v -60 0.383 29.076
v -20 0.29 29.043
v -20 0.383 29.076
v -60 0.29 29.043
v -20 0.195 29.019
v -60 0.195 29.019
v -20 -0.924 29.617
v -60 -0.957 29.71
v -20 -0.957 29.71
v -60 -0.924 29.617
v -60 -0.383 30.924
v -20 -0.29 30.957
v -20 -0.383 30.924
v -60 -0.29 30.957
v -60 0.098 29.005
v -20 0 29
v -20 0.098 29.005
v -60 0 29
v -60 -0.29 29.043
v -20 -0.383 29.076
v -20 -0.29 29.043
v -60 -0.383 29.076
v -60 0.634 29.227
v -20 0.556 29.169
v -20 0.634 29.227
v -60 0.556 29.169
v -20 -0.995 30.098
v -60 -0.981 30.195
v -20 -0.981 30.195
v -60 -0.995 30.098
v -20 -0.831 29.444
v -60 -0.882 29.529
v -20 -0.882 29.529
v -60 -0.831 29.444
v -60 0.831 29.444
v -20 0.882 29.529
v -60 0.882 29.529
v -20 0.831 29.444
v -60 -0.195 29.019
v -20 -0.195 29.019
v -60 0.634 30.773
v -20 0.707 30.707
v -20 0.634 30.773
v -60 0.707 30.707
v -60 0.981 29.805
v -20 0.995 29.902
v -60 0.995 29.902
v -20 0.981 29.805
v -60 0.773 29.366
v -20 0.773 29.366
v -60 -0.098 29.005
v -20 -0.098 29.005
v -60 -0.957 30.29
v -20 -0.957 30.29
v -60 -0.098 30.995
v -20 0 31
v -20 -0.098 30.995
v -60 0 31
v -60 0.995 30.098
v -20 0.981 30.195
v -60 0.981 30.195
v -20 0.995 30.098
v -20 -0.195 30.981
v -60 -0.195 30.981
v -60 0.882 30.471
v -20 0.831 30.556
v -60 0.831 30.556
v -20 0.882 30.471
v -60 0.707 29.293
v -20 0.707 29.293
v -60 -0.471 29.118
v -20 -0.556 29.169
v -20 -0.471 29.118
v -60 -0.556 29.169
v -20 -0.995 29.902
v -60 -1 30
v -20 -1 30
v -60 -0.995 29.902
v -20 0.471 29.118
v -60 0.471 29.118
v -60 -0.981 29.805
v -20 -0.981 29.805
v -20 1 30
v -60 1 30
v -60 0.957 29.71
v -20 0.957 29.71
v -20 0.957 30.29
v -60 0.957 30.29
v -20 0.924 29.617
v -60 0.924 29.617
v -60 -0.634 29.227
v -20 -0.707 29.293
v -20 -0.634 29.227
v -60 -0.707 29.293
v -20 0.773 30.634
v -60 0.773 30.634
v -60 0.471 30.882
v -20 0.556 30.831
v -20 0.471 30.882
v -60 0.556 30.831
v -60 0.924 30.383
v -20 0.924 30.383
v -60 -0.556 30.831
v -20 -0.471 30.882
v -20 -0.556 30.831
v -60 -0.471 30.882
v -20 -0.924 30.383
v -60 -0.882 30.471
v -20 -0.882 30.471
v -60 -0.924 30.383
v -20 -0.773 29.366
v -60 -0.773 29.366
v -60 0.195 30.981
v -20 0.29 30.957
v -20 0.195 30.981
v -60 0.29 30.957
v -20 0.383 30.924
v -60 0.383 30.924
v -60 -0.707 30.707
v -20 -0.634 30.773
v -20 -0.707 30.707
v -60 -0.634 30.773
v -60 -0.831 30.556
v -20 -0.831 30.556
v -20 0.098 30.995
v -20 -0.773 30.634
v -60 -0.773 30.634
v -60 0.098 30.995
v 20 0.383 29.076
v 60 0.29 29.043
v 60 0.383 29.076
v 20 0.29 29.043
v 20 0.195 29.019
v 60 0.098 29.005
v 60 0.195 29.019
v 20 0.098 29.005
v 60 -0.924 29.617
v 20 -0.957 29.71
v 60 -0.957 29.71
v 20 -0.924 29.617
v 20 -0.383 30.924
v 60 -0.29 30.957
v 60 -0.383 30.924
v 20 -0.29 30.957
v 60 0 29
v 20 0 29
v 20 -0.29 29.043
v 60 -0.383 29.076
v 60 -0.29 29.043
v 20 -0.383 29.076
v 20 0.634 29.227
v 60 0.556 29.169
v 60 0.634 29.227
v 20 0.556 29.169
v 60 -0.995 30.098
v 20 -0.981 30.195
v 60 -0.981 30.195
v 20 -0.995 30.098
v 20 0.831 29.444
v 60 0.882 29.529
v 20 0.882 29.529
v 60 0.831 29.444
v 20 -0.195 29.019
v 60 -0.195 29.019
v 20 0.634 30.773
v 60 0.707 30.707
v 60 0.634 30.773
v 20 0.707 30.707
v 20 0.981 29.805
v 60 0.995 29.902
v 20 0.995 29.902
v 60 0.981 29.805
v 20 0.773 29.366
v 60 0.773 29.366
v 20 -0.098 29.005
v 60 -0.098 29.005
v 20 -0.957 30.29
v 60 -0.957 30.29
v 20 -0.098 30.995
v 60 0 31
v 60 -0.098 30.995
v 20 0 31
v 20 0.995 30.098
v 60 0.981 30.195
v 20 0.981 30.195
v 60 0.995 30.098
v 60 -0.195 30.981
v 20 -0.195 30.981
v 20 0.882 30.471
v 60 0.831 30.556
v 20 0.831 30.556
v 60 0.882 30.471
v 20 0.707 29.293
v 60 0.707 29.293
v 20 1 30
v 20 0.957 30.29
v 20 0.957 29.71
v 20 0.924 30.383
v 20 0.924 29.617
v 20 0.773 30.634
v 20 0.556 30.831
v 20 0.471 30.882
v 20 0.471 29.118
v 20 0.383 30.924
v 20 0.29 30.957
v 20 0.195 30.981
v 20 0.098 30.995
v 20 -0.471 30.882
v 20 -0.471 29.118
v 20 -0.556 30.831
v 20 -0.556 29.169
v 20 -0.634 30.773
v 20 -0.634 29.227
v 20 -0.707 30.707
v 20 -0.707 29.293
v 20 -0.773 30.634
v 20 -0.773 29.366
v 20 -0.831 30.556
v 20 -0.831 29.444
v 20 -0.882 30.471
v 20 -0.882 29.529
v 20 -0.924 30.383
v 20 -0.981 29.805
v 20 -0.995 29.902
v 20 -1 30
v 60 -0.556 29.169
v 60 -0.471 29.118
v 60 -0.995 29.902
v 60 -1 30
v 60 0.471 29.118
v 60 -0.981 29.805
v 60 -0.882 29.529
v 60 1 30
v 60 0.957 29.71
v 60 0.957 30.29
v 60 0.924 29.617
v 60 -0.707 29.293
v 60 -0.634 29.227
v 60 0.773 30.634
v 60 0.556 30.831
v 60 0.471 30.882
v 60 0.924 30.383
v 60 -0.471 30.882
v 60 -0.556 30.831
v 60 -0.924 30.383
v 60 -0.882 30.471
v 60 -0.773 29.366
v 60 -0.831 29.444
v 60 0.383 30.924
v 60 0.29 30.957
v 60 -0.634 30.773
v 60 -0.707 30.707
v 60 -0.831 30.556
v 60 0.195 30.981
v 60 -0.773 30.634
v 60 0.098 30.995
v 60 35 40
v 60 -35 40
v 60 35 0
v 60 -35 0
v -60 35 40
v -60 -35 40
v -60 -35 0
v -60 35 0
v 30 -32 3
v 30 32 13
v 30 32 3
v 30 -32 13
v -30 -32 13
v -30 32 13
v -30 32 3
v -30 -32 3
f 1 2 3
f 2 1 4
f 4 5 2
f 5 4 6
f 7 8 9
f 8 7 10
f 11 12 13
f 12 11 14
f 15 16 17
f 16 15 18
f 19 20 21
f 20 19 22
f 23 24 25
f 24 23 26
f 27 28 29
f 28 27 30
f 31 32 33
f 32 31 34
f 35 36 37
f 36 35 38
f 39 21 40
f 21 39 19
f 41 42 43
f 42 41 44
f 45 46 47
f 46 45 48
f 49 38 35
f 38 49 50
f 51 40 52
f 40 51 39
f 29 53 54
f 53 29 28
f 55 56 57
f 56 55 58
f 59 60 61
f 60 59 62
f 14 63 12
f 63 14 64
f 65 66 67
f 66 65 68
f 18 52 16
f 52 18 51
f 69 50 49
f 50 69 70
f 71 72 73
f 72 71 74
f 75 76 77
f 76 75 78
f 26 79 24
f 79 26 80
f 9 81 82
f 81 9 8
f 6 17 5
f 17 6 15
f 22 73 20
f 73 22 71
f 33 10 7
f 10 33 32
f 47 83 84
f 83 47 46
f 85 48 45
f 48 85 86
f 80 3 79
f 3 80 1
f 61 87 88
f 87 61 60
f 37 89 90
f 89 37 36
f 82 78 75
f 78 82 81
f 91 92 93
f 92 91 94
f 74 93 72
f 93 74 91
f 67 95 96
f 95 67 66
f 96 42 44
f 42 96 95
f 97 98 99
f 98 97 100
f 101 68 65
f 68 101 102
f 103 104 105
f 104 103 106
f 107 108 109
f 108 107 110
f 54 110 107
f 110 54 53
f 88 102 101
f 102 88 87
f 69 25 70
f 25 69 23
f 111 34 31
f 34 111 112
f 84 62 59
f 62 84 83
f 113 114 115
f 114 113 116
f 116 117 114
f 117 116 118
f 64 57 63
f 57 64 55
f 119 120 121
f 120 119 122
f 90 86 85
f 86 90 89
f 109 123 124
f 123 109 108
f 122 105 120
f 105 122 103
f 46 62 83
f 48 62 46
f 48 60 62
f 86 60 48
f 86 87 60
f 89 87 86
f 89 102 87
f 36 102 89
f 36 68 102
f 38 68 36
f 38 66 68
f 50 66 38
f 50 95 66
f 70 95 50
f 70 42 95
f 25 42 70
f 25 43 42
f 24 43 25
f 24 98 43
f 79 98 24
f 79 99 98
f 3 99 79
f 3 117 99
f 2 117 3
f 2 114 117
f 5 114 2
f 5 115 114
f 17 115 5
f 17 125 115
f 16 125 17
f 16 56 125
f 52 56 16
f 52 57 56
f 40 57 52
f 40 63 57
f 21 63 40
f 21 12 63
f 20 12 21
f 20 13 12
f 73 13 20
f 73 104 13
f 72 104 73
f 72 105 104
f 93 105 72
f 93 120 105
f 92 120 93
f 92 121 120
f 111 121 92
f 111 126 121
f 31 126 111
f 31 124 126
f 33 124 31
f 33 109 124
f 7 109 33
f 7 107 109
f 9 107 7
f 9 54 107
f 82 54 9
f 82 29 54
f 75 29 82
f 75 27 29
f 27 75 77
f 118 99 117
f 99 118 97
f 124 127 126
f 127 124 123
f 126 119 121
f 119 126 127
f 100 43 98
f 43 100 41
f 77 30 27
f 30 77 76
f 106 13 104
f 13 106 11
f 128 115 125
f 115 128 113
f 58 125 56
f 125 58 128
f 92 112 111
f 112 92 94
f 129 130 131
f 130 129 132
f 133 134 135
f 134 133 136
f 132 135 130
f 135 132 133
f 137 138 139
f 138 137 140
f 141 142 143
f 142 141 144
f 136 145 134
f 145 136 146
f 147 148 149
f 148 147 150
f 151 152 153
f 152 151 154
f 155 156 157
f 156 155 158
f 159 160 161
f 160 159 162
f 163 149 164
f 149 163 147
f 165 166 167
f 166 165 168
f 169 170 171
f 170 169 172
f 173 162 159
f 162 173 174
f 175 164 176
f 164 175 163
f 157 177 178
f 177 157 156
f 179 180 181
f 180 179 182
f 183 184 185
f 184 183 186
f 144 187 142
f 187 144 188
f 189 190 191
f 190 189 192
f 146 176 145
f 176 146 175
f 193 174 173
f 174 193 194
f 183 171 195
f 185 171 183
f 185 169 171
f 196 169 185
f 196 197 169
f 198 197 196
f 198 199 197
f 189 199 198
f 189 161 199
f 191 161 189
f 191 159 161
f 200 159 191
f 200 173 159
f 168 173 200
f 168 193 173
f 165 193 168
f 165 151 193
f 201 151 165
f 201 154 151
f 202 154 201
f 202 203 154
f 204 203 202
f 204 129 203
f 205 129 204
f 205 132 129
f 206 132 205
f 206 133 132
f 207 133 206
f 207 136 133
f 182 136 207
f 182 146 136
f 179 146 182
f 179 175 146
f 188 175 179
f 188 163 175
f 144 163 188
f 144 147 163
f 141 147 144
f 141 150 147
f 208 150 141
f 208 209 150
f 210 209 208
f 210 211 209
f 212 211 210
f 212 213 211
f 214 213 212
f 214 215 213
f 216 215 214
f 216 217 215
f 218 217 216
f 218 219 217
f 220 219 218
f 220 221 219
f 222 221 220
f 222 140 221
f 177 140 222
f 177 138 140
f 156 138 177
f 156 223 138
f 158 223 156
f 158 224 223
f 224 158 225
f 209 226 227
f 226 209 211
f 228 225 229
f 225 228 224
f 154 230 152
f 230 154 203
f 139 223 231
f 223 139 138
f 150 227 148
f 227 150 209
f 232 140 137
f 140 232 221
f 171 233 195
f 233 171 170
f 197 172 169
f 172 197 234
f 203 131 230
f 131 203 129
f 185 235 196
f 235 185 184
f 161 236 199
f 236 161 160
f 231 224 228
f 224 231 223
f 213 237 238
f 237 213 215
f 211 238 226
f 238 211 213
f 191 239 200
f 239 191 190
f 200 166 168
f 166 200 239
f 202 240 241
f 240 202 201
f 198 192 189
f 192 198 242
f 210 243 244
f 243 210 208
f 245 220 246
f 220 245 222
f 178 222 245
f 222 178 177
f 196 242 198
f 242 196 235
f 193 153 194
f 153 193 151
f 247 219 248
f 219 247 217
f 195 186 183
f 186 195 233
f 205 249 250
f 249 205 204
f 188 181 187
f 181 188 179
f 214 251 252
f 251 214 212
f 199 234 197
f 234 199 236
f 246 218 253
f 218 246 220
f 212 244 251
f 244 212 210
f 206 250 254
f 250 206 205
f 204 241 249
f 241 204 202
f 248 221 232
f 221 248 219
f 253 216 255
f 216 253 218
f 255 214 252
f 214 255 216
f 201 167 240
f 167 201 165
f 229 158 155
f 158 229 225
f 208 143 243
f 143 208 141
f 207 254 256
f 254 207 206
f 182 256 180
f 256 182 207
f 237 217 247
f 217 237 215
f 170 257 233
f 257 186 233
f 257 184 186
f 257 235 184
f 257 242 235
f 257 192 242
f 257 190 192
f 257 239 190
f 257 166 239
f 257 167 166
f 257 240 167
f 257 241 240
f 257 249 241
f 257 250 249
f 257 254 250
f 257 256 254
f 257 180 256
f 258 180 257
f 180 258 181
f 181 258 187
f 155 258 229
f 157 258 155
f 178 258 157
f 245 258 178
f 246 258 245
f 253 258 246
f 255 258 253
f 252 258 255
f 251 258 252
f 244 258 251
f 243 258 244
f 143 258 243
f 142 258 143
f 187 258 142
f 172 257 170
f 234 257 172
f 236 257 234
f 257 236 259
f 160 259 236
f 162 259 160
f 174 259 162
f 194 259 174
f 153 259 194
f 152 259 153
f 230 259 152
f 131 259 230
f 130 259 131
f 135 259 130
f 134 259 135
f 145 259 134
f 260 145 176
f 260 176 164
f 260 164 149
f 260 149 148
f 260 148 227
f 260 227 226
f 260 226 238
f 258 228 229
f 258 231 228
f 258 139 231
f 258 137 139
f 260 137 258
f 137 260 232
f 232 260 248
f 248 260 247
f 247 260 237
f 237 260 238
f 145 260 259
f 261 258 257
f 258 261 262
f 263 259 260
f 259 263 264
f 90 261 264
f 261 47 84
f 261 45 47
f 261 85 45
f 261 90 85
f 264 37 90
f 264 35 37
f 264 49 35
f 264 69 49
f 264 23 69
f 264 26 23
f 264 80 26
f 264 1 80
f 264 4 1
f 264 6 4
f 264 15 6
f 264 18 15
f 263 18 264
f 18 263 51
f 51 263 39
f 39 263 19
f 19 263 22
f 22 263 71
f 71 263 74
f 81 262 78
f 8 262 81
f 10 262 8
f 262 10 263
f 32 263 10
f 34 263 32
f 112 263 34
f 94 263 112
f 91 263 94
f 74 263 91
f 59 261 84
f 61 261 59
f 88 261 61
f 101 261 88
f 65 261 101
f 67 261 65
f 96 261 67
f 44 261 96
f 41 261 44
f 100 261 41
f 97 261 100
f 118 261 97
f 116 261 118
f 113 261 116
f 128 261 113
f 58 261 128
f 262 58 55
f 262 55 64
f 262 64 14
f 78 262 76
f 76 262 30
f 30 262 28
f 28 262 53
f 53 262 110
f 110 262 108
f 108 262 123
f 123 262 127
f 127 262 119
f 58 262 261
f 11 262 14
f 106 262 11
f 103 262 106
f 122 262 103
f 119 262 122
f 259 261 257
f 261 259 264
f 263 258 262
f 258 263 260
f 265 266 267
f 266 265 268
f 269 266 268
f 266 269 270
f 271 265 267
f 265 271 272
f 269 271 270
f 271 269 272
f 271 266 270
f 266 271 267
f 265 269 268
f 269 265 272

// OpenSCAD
// Mini horizontal gel-electrophoresis buffer tank
// Print orientation: base on XY plane, open top facing +Z

// ---- Tank dimensions ----
outer_x = 120;   // outer length along X
outer_y = 70;    // outer width along Y
height  = 40;    // overall height along Z
wall    = 3;     // wall thickness
floor   = 3;     // floor thickness

// ---- Platform dimensions ----
plat_len   = 60;  // platform length along X
plat_top_z = 13;  // platform top height (10 mm above inner floor)

// ---- Wire holes ----
hole_d = 2;       // hole diameter
hole_y = 0;       // hole Y position
hole_z = 30;      // hole Z position

// ---- Derived ----
inner_x = outer_x - 2 * wall;   // 114
inner_z = height - floor;       // 37
inner_y = outer_y - 2 * wall;   // 64

$fn = 64;

difference() {
    // Tank body
    translate([-outer_x / 2, -outer_y / 2, 0])
        cube([outer_x, outer_y, height]);

    // Raised platform (full inner width, centred in X)
    translate([-plat_len / 2, -inner_y / 2, floor])
        cube([plat_len, inner_y, plat_top_z - floor]);

    // Horizontal wire holes through end walls
    for (sx = [-1, 1])
        translate([sx > 0 ? inner_x / 2 + 1 : -inner_x / 2 - 1, hole_y, hole_z])
            rotate([0, 90, 0])
                cylinder(d = hole_d, h = outer_y + 2 * wall, center = true);
}
